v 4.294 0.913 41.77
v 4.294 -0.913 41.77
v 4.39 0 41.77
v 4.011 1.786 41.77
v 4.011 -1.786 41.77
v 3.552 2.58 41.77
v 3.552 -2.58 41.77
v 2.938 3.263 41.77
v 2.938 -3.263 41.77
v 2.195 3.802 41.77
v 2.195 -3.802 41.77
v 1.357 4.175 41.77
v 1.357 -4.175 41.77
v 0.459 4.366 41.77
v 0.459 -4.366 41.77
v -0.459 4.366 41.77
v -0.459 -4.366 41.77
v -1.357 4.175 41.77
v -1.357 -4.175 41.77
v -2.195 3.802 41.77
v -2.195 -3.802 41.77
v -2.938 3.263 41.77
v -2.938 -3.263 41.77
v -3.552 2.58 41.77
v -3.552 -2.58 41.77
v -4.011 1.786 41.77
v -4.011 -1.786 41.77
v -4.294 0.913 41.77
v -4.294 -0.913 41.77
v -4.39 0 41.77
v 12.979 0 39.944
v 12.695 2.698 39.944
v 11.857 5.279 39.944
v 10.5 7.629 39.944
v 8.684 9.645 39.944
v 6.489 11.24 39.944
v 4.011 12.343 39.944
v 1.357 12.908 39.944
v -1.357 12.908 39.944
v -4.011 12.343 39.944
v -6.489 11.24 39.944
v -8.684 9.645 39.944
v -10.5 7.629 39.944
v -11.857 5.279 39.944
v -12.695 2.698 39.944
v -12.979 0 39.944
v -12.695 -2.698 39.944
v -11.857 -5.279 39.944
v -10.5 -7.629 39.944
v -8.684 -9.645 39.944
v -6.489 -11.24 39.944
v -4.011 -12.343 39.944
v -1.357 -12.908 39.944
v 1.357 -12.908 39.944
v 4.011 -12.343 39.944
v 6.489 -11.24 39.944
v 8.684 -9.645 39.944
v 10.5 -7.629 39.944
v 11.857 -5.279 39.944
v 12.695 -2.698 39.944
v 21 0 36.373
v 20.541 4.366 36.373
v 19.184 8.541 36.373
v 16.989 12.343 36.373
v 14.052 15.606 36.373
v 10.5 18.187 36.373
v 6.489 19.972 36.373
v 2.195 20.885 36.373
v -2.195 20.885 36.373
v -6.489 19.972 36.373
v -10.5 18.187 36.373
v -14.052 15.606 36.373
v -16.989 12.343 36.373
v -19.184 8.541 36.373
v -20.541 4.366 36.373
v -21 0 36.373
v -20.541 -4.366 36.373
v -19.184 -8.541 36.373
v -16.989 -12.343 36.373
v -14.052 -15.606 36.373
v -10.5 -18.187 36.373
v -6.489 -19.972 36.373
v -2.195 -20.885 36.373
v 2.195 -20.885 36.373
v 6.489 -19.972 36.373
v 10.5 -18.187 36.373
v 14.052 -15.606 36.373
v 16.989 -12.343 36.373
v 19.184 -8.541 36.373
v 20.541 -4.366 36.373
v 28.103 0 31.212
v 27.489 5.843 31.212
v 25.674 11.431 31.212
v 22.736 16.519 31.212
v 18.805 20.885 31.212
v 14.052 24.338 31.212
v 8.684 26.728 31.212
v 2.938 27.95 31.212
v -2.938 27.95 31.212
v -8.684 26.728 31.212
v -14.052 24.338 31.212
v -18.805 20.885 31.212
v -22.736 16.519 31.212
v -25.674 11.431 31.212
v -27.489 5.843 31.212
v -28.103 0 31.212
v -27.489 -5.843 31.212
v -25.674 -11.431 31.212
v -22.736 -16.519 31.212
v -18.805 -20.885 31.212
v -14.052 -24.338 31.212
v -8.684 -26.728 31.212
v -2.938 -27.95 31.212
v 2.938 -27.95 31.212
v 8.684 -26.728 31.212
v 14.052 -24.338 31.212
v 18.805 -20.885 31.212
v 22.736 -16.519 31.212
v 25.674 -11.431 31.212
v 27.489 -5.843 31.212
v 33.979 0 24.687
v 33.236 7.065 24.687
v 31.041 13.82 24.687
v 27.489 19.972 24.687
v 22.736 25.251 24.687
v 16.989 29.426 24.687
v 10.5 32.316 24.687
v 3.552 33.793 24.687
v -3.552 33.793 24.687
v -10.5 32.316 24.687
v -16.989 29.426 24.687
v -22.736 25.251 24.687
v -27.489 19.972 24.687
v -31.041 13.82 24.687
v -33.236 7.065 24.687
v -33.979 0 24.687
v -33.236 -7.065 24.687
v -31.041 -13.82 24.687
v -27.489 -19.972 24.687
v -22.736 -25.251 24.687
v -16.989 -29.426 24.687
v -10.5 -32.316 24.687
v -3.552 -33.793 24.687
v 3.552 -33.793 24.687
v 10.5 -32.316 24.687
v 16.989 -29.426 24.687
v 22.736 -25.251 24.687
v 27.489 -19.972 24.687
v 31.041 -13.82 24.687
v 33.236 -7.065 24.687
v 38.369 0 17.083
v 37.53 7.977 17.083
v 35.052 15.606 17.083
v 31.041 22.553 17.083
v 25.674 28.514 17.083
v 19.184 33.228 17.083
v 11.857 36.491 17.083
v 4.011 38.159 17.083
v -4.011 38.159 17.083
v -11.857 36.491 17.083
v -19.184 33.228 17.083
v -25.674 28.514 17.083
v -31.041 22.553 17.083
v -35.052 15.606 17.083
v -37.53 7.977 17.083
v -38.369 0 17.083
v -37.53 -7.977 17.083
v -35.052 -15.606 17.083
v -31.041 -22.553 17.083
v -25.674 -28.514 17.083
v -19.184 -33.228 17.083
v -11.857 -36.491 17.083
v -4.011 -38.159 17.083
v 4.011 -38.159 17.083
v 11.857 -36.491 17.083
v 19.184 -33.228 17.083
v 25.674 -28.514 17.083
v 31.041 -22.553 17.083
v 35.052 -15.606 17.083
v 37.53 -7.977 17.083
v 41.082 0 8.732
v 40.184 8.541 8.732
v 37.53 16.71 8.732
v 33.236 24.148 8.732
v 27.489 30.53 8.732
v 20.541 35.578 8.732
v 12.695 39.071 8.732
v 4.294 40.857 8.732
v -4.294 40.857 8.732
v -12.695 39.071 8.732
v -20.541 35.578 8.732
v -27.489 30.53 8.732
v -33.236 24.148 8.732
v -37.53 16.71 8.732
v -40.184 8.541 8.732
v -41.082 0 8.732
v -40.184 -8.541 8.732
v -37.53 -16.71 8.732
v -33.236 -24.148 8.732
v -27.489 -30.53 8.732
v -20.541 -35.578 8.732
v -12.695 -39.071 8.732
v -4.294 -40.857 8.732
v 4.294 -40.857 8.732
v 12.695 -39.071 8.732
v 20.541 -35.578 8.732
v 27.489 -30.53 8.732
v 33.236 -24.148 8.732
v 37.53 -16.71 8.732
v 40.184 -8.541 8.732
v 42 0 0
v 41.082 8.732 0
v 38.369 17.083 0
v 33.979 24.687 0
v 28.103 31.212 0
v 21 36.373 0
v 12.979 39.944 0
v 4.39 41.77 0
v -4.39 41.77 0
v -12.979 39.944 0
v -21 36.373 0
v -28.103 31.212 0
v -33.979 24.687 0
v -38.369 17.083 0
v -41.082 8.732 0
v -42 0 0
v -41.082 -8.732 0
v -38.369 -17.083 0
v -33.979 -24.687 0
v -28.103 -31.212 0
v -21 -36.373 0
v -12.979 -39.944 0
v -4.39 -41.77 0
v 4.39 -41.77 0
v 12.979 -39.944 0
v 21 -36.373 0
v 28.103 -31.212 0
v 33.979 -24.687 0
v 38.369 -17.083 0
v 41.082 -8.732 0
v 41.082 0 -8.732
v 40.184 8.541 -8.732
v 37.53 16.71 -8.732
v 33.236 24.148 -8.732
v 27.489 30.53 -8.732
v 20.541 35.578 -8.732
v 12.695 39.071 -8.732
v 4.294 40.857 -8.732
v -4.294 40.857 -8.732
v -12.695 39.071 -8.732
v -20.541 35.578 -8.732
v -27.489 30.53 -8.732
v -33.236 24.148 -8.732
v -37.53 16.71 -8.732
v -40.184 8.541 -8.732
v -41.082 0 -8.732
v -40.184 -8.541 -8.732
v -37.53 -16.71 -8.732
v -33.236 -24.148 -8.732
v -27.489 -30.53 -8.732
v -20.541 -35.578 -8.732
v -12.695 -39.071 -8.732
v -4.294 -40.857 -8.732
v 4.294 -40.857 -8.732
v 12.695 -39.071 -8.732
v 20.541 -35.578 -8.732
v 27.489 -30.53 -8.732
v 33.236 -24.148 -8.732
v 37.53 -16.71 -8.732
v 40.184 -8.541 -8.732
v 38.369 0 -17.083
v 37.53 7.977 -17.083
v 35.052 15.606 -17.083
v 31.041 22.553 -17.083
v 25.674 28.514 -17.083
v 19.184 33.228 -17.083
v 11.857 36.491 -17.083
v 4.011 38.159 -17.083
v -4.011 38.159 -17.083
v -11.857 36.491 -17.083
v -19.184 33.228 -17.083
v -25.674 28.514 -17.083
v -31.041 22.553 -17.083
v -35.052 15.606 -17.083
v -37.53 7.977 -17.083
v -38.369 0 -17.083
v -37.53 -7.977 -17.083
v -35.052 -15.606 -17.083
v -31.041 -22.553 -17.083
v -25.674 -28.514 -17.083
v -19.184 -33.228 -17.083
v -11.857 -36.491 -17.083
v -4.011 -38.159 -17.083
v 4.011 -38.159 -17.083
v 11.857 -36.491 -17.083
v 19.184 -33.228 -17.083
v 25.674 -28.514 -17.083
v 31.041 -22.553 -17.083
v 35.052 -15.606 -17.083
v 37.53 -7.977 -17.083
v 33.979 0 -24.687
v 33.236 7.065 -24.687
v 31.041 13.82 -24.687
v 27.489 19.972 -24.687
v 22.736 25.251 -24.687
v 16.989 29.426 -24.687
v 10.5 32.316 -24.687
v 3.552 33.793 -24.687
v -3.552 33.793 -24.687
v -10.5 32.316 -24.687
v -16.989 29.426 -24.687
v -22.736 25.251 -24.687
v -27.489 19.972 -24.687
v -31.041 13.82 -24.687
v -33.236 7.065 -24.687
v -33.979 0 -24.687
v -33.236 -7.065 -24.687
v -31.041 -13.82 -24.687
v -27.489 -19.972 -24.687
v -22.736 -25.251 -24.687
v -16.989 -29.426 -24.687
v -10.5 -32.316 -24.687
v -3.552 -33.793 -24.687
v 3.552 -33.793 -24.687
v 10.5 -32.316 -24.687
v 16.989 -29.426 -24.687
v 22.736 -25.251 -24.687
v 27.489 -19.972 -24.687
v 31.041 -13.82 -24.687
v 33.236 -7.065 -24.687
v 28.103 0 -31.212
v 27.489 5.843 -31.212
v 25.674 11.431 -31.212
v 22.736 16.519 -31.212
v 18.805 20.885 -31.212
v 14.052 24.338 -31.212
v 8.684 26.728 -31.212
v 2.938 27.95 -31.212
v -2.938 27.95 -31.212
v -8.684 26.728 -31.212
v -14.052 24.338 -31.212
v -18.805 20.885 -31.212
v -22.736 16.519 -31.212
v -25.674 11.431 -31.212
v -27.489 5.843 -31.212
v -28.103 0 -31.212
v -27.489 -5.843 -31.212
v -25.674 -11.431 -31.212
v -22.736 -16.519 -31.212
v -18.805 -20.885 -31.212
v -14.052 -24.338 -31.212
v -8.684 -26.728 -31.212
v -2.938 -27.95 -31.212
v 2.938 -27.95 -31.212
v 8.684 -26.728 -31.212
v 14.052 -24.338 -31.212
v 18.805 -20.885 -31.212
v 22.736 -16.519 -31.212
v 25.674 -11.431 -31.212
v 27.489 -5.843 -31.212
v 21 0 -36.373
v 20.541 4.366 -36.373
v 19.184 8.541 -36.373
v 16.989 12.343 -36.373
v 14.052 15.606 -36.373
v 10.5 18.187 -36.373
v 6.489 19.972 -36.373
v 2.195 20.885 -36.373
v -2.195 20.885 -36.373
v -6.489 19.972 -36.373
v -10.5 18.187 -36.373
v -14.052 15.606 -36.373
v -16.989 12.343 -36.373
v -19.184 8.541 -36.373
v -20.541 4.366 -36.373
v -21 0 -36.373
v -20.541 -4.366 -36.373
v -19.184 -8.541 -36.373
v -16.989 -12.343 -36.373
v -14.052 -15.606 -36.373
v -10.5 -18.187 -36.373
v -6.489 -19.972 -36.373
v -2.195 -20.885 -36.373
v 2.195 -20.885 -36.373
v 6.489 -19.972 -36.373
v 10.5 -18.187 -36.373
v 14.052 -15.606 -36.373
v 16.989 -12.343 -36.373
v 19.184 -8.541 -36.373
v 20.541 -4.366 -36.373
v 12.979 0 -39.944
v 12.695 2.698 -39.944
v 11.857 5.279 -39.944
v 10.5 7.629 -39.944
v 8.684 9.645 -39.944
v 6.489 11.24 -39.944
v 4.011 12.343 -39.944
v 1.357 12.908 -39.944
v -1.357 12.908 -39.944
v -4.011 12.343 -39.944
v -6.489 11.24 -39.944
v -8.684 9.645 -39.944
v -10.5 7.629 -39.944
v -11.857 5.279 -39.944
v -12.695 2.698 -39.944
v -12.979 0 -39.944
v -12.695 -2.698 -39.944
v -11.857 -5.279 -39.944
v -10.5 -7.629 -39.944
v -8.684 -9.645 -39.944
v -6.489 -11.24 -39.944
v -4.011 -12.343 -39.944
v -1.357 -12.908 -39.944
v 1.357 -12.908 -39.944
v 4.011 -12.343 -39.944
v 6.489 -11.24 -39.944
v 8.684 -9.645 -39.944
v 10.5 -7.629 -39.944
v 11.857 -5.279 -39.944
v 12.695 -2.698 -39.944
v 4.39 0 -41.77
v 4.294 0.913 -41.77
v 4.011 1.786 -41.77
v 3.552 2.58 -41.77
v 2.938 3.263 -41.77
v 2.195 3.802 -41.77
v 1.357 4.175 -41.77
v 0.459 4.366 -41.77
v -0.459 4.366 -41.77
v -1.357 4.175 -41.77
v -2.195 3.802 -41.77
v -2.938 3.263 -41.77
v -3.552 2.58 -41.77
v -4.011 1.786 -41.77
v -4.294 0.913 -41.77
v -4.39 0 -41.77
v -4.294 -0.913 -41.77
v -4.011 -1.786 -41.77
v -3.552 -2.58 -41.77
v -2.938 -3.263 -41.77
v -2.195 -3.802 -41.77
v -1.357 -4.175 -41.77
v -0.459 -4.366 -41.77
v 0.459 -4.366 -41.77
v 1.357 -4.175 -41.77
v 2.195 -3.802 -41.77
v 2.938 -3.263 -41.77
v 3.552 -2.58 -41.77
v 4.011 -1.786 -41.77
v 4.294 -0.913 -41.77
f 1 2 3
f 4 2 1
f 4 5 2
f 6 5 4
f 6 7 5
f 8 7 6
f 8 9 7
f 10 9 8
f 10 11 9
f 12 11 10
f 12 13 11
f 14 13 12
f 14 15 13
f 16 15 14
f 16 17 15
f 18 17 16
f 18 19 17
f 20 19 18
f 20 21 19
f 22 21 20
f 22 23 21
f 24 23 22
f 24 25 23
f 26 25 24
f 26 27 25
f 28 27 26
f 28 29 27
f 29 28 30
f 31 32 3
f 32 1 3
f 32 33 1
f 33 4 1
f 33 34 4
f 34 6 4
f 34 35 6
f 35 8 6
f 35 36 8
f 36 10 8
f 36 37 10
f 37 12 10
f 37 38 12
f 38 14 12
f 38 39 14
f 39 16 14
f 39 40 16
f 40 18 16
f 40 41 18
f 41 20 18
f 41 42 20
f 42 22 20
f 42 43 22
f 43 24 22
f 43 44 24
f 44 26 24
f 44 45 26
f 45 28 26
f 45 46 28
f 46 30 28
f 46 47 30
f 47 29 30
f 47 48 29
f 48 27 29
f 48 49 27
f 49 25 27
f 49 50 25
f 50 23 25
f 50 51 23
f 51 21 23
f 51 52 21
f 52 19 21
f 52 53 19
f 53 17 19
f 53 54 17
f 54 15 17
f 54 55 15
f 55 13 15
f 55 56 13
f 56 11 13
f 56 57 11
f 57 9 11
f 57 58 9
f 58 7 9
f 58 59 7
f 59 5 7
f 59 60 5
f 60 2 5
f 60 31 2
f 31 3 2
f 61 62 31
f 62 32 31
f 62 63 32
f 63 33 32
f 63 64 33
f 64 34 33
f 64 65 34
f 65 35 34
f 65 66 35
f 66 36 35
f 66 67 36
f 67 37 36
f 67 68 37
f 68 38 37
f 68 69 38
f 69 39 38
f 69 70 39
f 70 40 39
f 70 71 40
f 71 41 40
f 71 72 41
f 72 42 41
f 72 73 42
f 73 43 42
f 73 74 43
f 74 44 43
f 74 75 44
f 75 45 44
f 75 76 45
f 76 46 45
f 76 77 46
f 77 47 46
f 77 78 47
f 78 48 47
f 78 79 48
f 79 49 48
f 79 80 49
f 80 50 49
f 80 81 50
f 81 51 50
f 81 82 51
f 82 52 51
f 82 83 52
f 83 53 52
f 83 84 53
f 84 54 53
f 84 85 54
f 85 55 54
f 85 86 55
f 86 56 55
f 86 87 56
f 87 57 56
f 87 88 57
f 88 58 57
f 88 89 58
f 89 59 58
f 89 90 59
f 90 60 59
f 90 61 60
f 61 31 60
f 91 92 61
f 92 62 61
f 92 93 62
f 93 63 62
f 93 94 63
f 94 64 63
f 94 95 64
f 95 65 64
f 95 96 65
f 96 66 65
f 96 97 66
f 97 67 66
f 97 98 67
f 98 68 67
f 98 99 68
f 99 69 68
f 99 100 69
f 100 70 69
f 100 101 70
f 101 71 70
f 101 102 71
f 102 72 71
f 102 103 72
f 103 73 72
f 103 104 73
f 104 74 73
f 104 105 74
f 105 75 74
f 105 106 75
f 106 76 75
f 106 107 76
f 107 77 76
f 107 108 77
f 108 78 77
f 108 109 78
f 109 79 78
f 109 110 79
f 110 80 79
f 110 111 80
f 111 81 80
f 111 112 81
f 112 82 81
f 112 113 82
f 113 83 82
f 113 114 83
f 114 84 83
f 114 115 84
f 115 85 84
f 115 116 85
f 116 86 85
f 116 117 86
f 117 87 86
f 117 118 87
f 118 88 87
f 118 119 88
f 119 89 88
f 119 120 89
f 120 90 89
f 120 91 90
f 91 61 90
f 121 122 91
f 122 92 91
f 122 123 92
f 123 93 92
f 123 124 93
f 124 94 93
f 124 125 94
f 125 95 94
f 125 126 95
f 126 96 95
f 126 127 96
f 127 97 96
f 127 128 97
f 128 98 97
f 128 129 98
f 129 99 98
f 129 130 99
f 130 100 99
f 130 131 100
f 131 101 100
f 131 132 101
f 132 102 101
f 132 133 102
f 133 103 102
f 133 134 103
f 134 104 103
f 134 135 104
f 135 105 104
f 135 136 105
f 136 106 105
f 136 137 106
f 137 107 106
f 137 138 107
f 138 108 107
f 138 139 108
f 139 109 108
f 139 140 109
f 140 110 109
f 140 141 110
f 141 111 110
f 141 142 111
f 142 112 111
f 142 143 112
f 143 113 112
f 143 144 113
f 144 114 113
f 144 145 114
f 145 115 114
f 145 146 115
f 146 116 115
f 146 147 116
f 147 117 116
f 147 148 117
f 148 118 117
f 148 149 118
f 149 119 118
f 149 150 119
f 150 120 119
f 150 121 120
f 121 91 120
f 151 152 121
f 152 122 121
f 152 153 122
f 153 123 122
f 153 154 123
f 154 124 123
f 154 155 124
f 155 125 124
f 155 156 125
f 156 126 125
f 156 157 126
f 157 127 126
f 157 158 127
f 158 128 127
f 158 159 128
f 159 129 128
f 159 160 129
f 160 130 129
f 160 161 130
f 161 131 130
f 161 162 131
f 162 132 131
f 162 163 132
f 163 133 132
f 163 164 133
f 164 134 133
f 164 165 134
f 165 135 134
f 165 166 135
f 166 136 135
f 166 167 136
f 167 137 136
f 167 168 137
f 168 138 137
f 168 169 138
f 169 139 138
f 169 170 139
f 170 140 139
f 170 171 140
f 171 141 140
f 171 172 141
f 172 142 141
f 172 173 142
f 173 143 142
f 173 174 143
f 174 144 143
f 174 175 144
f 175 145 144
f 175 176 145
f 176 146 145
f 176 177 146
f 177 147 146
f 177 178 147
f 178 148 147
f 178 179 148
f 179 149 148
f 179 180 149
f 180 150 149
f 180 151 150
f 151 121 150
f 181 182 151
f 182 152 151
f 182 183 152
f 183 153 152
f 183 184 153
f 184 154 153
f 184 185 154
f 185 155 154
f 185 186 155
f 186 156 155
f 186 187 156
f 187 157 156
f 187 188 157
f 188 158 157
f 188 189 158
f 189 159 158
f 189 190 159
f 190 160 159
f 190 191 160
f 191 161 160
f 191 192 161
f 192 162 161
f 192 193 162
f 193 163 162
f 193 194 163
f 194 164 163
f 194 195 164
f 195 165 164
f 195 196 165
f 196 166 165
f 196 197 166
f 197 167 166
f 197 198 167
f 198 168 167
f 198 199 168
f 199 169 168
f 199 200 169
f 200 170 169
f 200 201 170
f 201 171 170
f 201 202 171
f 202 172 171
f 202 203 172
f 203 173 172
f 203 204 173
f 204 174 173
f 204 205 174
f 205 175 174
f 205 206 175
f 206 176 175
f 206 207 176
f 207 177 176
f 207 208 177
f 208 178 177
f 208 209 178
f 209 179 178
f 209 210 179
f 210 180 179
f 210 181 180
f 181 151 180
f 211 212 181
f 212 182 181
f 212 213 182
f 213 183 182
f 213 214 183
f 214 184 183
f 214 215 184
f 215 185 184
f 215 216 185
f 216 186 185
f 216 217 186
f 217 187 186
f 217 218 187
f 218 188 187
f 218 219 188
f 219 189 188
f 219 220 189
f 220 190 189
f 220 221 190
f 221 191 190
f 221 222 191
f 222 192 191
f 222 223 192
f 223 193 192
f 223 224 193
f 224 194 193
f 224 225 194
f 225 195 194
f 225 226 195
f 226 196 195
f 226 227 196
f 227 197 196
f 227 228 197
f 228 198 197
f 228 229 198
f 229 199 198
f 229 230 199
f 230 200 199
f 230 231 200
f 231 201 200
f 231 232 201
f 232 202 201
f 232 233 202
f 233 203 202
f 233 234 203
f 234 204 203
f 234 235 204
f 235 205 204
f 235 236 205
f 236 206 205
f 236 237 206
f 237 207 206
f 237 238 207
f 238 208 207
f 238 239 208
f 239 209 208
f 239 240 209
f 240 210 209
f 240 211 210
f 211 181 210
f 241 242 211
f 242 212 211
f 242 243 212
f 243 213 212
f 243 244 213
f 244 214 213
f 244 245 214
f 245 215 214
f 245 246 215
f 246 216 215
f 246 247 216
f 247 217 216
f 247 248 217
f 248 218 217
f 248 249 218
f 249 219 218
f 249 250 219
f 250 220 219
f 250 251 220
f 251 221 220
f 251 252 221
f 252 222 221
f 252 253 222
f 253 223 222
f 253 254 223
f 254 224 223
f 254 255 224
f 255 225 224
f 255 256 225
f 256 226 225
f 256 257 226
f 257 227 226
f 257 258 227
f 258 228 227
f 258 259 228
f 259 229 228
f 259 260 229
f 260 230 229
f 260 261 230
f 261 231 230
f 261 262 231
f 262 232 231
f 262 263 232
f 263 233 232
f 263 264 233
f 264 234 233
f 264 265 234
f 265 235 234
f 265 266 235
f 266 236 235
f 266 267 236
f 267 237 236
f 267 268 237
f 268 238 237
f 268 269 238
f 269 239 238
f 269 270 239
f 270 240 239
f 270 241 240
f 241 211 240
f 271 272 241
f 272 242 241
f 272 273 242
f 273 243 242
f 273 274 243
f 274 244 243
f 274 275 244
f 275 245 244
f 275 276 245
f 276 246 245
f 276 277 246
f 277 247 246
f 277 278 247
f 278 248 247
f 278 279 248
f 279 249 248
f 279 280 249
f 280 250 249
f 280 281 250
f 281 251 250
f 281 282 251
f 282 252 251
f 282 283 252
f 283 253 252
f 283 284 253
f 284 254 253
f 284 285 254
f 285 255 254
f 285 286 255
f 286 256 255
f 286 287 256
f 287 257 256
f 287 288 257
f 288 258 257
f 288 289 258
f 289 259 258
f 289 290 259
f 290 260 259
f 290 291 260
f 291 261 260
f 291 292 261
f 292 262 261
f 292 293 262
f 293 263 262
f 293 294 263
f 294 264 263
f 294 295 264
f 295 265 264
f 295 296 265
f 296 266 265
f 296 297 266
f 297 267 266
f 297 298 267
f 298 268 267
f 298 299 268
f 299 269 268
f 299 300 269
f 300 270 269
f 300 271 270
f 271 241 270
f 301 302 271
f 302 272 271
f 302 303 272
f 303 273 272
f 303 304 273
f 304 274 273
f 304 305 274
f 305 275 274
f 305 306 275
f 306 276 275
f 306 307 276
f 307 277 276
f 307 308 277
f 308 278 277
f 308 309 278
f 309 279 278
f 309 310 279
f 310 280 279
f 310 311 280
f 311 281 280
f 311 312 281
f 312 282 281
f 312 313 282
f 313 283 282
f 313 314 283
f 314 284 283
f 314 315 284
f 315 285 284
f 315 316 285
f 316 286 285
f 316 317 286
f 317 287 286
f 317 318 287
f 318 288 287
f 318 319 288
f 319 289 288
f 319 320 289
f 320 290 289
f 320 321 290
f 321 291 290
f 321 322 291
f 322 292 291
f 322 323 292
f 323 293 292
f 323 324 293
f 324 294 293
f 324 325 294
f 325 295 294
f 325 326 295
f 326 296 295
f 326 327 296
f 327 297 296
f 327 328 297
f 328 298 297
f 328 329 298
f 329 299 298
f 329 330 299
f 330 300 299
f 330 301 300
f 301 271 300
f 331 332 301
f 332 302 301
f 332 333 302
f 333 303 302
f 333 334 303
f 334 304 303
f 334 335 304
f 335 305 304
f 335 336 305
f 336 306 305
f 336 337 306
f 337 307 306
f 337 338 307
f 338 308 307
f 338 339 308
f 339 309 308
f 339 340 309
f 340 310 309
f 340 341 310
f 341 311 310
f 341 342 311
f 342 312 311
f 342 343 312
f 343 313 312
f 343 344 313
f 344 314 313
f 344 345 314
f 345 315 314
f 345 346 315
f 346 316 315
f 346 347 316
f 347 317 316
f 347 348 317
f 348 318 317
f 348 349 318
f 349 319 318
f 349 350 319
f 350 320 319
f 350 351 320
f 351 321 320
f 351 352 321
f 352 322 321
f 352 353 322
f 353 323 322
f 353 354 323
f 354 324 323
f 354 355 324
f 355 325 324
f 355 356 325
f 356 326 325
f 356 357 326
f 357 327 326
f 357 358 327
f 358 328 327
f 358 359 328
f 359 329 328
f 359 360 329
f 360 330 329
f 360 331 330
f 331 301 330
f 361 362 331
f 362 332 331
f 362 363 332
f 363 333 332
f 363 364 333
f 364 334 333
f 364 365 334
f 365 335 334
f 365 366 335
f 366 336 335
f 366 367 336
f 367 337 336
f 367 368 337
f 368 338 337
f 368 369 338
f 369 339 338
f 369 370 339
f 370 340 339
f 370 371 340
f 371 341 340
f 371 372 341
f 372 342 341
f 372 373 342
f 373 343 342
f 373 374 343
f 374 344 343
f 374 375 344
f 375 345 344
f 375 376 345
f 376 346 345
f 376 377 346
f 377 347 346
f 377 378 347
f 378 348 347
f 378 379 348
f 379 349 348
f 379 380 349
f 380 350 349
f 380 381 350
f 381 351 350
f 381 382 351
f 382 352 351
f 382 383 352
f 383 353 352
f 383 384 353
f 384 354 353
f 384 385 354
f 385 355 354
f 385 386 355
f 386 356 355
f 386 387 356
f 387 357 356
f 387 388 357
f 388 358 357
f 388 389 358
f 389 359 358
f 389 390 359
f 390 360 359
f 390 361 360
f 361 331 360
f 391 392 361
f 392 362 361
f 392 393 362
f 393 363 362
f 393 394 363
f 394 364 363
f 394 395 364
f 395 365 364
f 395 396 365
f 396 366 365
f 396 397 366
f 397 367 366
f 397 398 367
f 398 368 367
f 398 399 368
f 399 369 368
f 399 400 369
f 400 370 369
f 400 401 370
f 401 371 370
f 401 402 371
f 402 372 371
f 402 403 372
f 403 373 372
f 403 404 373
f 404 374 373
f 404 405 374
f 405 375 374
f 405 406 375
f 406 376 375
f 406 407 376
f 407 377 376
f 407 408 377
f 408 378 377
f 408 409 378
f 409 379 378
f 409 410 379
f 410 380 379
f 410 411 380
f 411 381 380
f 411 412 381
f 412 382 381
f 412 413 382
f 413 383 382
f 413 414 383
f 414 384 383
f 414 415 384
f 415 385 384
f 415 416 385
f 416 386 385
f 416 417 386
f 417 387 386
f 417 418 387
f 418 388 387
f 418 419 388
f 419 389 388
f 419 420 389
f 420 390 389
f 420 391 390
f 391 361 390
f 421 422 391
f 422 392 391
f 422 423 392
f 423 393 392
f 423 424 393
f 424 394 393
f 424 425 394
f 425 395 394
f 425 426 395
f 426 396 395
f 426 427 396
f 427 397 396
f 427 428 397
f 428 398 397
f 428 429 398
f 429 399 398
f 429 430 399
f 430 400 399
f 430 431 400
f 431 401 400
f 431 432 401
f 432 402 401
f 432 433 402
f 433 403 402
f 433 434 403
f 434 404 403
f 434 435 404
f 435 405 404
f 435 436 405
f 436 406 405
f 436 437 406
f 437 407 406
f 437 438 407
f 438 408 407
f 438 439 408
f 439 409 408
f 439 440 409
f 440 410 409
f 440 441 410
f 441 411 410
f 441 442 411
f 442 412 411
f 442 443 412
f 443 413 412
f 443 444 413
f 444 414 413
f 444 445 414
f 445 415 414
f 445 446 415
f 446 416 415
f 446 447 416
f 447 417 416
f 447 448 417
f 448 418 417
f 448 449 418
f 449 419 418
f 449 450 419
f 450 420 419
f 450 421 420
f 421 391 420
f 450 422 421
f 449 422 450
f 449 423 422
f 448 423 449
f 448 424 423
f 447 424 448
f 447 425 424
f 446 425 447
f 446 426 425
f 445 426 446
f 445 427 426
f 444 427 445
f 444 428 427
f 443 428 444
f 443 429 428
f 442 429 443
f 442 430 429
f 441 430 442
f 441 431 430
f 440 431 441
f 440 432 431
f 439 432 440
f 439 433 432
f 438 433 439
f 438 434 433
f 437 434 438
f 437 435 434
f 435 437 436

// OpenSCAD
// file: included_with_sections.scad
/* [Library Settings] */

libVar = 42;

/* [Library Advanced] */

libDetail = 8;

module libModule() {
  sphere(r=libVar);
}
// main file
/* [My Settings] */

// Size of the object
MySize = 10;

include <included_with_sections.scad>

libModule();
